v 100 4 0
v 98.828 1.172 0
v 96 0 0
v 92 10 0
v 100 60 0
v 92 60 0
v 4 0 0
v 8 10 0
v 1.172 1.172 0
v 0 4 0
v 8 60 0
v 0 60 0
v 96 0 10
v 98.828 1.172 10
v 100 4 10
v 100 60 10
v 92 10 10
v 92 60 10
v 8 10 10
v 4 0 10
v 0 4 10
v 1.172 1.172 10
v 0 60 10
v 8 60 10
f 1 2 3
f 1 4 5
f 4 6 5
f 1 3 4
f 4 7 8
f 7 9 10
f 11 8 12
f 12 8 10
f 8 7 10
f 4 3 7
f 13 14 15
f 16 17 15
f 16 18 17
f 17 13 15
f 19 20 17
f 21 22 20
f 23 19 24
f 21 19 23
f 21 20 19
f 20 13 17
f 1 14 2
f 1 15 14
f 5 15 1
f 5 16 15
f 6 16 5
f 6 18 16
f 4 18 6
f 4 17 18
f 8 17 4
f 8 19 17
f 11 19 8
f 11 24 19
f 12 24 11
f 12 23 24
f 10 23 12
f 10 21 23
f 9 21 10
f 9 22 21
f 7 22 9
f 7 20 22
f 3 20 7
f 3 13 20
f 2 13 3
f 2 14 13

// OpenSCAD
$fn = 32;

// ----------------------------------------------------------------------
// Heat sink frame: 100 x 60 mm frame, 8 mm walls
// ----------------------------------------------------------------------

// --- parameters (mm) ---
profile_height = 10;      // extrusion height
profile_points = 12;      // points of the closed outline

profile = [[0, 4], [1.172, 1.172], [4, 0], [96, 0], [98.828, 1.172], [100, 4], [100, 60], [92, 60], [92, 10], [8, 10], [8, 60], [0, 60]];  // single closed polygon, 12 points, counter clockwise

// --- the one profile operation ---
linear_extrude(height = profile_height) polygon(points = profile);
